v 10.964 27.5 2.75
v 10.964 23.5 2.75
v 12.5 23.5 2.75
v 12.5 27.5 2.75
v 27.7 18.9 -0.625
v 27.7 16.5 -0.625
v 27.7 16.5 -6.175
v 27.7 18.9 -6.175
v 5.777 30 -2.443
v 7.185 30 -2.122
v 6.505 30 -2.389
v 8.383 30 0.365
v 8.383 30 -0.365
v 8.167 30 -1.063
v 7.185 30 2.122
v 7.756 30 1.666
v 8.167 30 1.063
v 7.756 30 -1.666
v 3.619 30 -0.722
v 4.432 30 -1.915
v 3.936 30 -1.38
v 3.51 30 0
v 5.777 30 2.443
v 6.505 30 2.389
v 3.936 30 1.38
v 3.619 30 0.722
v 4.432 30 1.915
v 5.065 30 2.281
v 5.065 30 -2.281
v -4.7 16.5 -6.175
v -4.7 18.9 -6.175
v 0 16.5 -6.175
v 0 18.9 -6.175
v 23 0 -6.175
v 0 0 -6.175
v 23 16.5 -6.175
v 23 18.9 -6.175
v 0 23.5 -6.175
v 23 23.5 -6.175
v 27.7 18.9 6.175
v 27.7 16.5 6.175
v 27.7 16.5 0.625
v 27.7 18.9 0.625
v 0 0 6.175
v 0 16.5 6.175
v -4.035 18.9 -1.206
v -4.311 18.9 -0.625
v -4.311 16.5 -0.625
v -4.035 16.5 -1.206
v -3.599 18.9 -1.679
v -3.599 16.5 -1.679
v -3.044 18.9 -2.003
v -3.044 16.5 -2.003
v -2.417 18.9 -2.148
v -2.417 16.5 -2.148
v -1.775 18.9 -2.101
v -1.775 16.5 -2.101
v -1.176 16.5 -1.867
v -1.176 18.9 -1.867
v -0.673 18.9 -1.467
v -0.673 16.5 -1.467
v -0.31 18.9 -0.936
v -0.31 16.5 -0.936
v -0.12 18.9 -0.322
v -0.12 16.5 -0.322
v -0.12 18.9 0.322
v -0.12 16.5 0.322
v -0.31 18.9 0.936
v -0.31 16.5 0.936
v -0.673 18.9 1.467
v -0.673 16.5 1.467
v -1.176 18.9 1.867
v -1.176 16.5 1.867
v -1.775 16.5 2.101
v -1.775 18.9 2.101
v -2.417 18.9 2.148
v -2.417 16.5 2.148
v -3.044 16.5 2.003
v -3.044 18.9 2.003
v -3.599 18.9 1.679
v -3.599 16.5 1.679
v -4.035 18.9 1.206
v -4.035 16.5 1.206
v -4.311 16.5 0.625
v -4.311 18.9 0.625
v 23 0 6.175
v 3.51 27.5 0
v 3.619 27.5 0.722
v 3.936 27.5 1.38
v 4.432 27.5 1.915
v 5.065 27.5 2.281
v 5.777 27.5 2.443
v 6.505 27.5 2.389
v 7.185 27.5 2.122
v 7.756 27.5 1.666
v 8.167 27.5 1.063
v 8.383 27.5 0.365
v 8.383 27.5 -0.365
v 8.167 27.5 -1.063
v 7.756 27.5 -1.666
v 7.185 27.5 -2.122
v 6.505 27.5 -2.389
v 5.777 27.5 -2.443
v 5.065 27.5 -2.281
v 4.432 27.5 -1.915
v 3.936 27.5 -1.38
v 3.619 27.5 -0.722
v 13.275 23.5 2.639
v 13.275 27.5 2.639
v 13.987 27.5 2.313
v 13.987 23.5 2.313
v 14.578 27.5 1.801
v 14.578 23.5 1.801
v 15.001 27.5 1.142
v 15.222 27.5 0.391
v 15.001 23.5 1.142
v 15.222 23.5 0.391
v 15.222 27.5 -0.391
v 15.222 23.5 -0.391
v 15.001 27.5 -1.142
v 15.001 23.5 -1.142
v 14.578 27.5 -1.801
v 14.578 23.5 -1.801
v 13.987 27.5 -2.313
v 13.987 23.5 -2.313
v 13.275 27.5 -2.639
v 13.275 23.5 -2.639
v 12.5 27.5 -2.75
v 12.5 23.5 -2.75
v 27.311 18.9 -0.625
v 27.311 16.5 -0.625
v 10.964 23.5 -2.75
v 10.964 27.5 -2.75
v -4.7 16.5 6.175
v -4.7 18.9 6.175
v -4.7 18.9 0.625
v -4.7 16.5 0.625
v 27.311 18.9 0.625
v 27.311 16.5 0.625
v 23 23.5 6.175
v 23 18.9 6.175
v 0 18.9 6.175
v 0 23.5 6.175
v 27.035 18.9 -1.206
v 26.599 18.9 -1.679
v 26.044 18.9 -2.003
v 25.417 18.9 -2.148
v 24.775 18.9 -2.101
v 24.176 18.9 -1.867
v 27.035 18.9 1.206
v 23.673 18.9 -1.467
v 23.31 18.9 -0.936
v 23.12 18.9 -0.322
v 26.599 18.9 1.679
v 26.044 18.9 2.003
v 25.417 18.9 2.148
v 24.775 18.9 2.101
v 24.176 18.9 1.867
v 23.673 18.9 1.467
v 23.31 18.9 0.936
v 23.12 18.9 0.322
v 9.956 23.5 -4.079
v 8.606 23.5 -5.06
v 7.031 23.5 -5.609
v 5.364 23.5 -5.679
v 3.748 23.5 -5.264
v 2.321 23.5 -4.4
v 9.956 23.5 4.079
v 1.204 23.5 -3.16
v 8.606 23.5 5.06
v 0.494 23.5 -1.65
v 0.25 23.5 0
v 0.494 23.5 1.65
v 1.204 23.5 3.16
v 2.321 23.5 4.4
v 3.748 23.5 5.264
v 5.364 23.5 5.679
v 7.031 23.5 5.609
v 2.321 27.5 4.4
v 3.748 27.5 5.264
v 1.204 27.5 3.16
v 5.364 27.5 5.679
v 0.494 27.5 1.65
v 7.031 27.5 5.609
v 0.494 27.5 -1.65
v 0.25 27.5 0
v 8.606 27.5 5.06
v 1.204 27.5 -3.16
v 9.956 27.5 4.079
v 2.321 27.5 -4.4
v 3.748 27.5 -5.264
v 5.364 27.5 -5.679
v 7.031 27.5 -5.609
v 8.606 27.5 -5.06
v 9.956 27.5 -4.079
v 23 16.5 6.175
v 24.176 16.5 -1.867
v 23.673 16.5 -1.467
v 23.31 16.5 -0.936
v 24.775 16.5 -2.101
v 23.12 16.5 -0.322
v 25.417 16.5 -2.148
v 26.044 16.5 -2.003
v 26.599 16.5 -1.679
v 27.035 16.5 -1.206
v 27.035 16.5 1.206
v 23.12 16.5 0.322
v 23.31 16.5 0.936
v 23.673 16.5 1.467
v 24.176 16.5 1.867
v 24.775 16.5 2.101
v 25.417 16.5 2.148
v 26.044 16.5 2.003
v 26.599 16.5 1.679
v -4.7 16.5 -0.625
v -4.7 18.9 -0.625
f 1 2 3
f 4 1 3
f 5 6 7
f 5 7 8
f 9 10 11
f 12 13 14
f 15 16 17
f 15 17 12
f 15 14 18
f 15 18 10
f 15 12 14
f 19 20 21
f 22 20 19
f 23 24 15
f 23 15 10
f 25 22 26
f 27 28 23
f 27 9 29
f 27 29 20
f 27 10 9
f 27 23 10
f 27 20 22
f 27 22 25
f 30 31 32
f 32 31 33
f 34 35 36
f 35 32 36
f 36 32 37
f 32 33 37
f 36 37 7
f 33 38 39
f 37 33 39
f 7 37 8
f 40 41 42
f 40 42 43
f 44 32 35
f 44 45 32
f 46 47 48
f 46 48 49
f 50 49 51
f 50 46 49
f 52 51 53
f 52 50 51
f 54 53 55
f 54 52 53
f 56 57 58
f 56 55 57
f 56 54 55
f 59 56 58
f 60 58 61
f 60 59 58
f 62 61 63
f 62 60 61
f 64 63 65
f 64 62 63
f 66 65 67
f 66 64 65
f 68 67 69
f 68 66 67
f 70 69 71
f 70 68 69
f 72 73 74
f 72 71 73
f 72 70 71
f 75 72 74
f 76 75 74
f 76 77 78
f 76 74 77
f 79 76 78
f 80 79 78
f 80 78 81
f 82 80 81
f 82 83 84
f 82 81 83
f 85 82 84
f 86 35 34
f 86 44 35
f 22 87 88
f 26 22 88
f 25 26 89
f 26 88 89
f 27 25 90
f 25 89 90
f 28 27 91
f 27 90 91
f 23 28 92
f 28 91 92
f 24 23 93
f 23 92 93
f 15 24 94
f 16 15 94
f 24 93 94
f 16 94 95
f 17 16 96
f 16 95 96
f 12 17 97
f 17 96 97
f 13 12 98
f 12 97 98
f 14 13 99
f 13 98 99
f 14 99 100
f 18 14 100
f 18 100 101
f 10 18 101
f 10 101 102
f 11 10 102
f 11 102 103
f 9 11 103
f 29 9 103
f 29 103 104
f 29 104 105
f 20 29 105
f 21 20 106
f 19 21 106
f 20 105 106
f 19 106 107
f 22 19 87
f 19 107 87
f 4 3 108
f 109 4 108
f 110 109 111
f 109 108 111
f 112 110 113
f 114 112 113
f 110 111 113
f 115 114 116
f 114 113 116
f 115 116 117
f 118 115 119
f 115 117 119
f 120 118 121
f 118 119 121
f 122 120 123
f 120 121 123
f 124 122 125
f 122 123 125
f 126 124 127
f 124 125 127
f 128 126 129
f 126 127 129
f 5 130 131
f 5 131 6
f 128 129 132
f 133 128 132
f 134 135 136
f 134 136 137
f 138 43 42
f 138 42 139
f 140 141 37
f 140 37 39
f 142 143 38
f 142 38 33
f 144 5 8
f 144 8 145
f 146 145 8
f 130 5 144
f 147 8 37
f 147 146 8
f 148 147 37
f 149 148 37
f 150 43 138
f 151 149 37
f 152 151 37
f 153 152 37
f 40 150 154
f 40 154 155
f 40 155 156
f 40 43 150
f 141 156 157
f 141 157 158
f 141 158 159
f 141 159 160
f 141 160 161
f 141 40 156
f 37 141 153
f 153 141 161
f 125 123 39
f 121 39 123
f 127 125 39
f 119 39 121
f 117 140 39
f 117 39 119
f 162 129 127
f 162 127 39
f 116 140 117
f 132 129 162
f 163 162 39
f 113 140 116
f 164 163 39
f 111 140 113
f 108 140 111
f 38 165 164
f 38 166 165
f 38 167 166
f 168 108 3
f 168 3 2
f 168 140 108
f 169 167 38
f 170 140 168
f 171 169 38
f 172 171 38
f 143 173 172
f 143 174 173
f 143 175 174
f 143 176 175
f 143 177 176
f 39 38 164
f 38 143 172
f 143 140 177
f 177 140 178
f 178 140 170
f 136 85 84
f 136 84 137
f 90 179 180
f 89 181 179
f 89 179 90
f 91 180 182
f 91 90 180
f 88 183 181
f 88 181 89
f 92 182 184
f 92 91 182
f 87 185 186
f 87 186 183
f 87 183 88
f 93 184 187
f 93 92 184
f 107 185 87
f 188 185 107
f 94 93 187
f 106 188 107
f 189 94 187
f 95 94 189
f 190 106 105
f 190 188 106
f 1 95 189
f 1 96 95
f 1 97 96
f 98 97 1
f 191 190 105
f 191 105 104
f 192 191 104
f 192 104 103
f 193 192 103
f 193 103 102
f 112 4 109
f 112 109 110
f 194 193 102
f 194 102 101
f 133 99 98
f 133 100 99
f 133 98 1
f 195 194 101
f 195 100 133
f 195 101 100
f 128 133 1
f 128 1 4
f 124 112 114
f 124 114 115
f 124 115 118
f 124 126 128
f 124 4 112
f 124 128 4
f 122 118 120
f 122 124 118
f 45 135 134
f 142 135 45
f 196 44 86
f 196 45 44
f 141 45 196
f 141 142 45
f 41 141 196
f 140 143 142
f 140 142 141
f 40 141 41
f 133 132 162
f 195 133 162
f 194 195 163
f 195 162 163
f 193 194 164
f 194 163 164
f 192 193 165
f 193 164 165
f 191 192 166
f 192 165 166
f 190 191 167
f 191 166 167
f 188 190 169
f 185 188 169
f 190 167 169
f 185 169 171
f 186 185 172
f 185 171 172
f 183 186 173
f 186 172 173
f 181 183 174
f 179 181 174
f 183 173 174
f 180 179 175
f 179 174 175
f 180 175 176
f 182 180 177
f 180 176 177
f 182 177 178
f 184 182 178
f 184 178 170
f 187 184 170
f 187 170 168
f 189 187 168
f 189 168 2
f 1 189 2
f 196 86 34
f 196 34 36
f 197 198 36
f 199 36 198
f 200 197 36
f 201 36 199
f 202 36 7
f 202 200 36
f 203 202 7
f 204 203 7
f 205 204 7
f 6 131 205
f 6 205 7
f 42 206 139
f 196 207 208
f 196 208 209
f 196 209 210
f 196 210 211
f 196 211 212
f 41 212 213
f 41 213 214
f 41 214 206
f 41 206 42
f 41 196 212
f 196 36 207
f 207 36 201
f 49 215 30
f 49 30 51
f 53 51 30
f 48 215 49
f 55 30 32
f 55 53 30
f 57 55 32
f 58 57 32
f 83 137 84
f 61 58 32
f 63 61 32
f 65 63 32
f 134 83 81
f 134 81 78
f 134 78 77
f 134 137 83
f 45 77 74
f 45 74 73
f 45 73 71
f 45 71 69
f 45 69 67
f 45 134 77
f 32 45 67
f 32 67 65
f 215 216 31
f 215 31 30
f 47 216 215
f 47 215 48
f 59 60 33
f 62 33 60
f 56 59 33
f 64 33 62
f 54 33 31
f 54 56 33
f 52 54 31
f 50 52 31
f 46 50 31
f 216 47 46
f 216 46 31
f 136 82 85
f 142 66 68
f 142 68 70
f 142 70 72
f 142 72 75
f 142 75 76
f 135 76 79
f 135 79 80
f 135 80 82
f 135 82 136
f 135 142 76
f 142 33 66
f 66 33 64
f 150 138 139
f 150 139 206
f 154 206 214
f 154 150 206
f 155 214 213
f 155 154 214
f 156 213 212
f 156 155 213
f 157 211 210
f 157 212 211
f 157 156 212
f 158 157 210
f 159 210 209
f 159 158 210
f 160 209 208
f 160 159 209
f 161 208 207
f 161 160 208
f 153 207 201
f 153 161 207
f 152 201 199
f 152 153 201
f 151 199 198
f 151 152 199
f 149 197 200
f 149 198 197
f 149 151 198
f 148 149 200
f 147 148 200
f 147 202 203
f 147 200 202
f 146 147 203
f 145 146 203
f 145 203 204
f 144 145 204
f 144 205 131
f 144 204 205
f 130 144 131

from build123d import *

# Parameters (mm, degrees)
BOSS_EXTRUDE1_DEPTH = 6.175
BOSS_EXTRUDE2_DEPTH = 4
SKETCH4_R           = 2.45
BOSS_EXTRUDE3_DEPTH = 2.5
CUT_EXTRUDE1_REACH  = 36.097


with BuildPart() as part:
    # Sketch1 → Boss-Extrude1 (new, symmetric)
    with BuildSketch(Plane.XY):
        Polygon((0, 0), (23, 0), (23, 16.5), (27.7, 16.5), (27.7, 18.9), (23, 18.9), (23, 23.5), (0, 23.5), (0, 18.9), (-4.7, 18.9), (-4.7, 16.5), (0, 16.5), align=None)
    extrude(amount=BOSS_EXTRUDE1_DEPTH, both=True)

    # Sketch3 → Boss-Extrude2 (add)
    with BuildSketch(Plane(origin=(0, 23.5, 0), x_dir=(1, 0, 0), z_dir=(0, 1, 0))):
        with BuildLine():
            Line((12.5, 2.75), (10.964158271, 2.75))
            ThreePointArc((10.964158271, 2.75), (0.25, 0), (10.964158271, -2.75))
            Line((10.964158271, -2.75), (12.5, -2.75))
            ThreePointArc((12.5, -2.75), (15.25, 0), (12.5, 2.75))
        make_face()
    extrude(amount=BOSS_EXTRUDE2_DEPTH)

    # Sketch4 → Boss-Extrude3 (add)
    with BuildSketch(Plane(origin=(0, 27.5, 0), x_dir=(1, 0, 0), z_dir=(0, 1, 0))):
        with Locations(Location((5.96, 0, 0), (0, 0, 180))):
            Circle(SKETCH4_R)
    extrude(amount=BOSS_EXTRUDE3_DEPTH)

    # Sketch5 → Cut-Extrude1 (cut, up to next)
    with BuildSketch(Plane(origin=(0, 18.9, 0), x_dir=(1, 0, 0), z_dir=(0, 1, 0)), mode=Mode.PRIVATE) as cut_extrude1_sk1:
        with BuildLine():
            Line((-4.7, 0.625), (-4.311332336, 0.625))
            ThreePointArc((-4.311332336, 0.625), (-0.096, 0), (-4.311332336, -0.625))
            Line((-4.311332336, -0.625), (-4.7, -0.625))
            Line((-4.7, -0.625), (-4.7, 0.625))
        make_face()
    cut_extrude1_tool1 = extrude(cut_extrude1_sk1.sketch, amount=-CUT_EXTRUDE1_REACH, mode=Mode.PRIVATE) & part.part
    # Sketch5 → Cut-Extrude1 (cut, up to next)
    with BuildSketch(Plane(origin=(0, 18.9, 0), x_dir=(1, 0, 0), z_dir=(0, 1, 0)), mode=Mode.PRIVATE) as cut_extrude1_sk2:
        with BuildLine():
            Line((27.311332336, 0.625), (27.7, 0.625))
            Line((27.7, 0.625), (27.7, -0.625))
            Line((27.7, -0.625), (27.311332336, -0.625))
            ThreePointArc((27.311332336, -0.625), (23.096, 0), (27.311332336, 0.625))
        make_face()
    cut_extrude1_tool2 = extrude(cut_extrude1_sk2.sketch, amount=-CUT_EXTRUDE1_REACH, mode=Mode.PRIVATE) & part.part
    add(cut_extrude1_tool1.solids().sort_by_distance((-2.312273, 18.9, 0))[0], mode=Mode.SUBTRACT)
    add(cut_extrude1_tool2.solids().sort_by_distance((25.312273, 18.9, 0))[0], mode=Mode.SUBTRACT)


solid = part.part
